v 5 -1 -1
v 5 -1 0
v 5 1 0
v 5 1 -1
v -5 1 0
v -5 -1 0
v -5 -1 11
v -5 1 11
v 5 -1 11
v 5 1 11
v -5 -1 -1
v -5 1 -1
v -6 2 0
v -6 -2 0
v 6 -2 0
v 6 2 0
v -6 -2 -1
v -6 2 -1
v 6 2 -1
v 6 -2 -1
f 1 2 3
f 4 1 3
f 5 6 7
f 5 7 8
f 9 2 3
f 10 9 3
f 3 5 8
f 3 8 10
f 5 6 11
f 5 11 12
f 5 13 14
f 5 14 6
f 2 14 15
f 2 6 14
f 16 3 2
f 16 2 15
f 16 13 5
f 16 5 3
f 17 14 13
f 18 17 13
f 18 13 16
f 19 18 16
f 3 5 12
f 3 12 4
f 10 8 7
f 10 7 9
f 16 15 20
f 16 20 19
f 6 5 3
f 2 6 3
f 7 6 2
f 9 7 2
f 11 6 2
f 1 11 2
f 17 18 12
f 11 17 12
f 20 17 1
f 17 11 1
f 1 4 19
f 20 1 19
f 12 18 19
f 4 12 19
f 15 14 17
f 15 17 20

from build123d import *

# Parameters (mm, degrees)
SCHIZZO1_W                   = 10
SCHIZZO1_H                   = 2
ESTRUSIONE_ESTRUSIONE1_DEPTH = 11
SCHIZZO1_4_W                 = 12
SCHIZZO1_4_H                 = 4
SCHIZZO1_4_W_2               = 10
SCHIZZO1_4_H_2               = 2
ESTRUSIONE_ESTRUSIONE2_DEPTH = 1


with BuildPart() as part:
    # Schizzo1 → Estrusione-Estrusione1 (new body)
    with BuildSketch(Plane.XY):
        Rectangle(SCHIZZO1_W, SCHIZZO1_H)
    extrude(amount=ESTRUSIONE_ESTRUSIONE1_DEPTH)


with BuildPart() as body_2:
    # Schizzo1<4> → Estrusione-Estrusione2 (new body)
    with BuildSketch(Plane.XY):
        Rectangle(SCHIZZO1_4_W, SCHIZZO1_4_H)
        Rectangle(SCHIZZO1_4_W_2, SCHIZZO1_4_H_2, mode=Mode.SUBTRACT)
    extrude(amount=-ESTRUSIONE_ESTRUSIONE2_DEPTH)


solid = Compound([part.part, body_2.part])
